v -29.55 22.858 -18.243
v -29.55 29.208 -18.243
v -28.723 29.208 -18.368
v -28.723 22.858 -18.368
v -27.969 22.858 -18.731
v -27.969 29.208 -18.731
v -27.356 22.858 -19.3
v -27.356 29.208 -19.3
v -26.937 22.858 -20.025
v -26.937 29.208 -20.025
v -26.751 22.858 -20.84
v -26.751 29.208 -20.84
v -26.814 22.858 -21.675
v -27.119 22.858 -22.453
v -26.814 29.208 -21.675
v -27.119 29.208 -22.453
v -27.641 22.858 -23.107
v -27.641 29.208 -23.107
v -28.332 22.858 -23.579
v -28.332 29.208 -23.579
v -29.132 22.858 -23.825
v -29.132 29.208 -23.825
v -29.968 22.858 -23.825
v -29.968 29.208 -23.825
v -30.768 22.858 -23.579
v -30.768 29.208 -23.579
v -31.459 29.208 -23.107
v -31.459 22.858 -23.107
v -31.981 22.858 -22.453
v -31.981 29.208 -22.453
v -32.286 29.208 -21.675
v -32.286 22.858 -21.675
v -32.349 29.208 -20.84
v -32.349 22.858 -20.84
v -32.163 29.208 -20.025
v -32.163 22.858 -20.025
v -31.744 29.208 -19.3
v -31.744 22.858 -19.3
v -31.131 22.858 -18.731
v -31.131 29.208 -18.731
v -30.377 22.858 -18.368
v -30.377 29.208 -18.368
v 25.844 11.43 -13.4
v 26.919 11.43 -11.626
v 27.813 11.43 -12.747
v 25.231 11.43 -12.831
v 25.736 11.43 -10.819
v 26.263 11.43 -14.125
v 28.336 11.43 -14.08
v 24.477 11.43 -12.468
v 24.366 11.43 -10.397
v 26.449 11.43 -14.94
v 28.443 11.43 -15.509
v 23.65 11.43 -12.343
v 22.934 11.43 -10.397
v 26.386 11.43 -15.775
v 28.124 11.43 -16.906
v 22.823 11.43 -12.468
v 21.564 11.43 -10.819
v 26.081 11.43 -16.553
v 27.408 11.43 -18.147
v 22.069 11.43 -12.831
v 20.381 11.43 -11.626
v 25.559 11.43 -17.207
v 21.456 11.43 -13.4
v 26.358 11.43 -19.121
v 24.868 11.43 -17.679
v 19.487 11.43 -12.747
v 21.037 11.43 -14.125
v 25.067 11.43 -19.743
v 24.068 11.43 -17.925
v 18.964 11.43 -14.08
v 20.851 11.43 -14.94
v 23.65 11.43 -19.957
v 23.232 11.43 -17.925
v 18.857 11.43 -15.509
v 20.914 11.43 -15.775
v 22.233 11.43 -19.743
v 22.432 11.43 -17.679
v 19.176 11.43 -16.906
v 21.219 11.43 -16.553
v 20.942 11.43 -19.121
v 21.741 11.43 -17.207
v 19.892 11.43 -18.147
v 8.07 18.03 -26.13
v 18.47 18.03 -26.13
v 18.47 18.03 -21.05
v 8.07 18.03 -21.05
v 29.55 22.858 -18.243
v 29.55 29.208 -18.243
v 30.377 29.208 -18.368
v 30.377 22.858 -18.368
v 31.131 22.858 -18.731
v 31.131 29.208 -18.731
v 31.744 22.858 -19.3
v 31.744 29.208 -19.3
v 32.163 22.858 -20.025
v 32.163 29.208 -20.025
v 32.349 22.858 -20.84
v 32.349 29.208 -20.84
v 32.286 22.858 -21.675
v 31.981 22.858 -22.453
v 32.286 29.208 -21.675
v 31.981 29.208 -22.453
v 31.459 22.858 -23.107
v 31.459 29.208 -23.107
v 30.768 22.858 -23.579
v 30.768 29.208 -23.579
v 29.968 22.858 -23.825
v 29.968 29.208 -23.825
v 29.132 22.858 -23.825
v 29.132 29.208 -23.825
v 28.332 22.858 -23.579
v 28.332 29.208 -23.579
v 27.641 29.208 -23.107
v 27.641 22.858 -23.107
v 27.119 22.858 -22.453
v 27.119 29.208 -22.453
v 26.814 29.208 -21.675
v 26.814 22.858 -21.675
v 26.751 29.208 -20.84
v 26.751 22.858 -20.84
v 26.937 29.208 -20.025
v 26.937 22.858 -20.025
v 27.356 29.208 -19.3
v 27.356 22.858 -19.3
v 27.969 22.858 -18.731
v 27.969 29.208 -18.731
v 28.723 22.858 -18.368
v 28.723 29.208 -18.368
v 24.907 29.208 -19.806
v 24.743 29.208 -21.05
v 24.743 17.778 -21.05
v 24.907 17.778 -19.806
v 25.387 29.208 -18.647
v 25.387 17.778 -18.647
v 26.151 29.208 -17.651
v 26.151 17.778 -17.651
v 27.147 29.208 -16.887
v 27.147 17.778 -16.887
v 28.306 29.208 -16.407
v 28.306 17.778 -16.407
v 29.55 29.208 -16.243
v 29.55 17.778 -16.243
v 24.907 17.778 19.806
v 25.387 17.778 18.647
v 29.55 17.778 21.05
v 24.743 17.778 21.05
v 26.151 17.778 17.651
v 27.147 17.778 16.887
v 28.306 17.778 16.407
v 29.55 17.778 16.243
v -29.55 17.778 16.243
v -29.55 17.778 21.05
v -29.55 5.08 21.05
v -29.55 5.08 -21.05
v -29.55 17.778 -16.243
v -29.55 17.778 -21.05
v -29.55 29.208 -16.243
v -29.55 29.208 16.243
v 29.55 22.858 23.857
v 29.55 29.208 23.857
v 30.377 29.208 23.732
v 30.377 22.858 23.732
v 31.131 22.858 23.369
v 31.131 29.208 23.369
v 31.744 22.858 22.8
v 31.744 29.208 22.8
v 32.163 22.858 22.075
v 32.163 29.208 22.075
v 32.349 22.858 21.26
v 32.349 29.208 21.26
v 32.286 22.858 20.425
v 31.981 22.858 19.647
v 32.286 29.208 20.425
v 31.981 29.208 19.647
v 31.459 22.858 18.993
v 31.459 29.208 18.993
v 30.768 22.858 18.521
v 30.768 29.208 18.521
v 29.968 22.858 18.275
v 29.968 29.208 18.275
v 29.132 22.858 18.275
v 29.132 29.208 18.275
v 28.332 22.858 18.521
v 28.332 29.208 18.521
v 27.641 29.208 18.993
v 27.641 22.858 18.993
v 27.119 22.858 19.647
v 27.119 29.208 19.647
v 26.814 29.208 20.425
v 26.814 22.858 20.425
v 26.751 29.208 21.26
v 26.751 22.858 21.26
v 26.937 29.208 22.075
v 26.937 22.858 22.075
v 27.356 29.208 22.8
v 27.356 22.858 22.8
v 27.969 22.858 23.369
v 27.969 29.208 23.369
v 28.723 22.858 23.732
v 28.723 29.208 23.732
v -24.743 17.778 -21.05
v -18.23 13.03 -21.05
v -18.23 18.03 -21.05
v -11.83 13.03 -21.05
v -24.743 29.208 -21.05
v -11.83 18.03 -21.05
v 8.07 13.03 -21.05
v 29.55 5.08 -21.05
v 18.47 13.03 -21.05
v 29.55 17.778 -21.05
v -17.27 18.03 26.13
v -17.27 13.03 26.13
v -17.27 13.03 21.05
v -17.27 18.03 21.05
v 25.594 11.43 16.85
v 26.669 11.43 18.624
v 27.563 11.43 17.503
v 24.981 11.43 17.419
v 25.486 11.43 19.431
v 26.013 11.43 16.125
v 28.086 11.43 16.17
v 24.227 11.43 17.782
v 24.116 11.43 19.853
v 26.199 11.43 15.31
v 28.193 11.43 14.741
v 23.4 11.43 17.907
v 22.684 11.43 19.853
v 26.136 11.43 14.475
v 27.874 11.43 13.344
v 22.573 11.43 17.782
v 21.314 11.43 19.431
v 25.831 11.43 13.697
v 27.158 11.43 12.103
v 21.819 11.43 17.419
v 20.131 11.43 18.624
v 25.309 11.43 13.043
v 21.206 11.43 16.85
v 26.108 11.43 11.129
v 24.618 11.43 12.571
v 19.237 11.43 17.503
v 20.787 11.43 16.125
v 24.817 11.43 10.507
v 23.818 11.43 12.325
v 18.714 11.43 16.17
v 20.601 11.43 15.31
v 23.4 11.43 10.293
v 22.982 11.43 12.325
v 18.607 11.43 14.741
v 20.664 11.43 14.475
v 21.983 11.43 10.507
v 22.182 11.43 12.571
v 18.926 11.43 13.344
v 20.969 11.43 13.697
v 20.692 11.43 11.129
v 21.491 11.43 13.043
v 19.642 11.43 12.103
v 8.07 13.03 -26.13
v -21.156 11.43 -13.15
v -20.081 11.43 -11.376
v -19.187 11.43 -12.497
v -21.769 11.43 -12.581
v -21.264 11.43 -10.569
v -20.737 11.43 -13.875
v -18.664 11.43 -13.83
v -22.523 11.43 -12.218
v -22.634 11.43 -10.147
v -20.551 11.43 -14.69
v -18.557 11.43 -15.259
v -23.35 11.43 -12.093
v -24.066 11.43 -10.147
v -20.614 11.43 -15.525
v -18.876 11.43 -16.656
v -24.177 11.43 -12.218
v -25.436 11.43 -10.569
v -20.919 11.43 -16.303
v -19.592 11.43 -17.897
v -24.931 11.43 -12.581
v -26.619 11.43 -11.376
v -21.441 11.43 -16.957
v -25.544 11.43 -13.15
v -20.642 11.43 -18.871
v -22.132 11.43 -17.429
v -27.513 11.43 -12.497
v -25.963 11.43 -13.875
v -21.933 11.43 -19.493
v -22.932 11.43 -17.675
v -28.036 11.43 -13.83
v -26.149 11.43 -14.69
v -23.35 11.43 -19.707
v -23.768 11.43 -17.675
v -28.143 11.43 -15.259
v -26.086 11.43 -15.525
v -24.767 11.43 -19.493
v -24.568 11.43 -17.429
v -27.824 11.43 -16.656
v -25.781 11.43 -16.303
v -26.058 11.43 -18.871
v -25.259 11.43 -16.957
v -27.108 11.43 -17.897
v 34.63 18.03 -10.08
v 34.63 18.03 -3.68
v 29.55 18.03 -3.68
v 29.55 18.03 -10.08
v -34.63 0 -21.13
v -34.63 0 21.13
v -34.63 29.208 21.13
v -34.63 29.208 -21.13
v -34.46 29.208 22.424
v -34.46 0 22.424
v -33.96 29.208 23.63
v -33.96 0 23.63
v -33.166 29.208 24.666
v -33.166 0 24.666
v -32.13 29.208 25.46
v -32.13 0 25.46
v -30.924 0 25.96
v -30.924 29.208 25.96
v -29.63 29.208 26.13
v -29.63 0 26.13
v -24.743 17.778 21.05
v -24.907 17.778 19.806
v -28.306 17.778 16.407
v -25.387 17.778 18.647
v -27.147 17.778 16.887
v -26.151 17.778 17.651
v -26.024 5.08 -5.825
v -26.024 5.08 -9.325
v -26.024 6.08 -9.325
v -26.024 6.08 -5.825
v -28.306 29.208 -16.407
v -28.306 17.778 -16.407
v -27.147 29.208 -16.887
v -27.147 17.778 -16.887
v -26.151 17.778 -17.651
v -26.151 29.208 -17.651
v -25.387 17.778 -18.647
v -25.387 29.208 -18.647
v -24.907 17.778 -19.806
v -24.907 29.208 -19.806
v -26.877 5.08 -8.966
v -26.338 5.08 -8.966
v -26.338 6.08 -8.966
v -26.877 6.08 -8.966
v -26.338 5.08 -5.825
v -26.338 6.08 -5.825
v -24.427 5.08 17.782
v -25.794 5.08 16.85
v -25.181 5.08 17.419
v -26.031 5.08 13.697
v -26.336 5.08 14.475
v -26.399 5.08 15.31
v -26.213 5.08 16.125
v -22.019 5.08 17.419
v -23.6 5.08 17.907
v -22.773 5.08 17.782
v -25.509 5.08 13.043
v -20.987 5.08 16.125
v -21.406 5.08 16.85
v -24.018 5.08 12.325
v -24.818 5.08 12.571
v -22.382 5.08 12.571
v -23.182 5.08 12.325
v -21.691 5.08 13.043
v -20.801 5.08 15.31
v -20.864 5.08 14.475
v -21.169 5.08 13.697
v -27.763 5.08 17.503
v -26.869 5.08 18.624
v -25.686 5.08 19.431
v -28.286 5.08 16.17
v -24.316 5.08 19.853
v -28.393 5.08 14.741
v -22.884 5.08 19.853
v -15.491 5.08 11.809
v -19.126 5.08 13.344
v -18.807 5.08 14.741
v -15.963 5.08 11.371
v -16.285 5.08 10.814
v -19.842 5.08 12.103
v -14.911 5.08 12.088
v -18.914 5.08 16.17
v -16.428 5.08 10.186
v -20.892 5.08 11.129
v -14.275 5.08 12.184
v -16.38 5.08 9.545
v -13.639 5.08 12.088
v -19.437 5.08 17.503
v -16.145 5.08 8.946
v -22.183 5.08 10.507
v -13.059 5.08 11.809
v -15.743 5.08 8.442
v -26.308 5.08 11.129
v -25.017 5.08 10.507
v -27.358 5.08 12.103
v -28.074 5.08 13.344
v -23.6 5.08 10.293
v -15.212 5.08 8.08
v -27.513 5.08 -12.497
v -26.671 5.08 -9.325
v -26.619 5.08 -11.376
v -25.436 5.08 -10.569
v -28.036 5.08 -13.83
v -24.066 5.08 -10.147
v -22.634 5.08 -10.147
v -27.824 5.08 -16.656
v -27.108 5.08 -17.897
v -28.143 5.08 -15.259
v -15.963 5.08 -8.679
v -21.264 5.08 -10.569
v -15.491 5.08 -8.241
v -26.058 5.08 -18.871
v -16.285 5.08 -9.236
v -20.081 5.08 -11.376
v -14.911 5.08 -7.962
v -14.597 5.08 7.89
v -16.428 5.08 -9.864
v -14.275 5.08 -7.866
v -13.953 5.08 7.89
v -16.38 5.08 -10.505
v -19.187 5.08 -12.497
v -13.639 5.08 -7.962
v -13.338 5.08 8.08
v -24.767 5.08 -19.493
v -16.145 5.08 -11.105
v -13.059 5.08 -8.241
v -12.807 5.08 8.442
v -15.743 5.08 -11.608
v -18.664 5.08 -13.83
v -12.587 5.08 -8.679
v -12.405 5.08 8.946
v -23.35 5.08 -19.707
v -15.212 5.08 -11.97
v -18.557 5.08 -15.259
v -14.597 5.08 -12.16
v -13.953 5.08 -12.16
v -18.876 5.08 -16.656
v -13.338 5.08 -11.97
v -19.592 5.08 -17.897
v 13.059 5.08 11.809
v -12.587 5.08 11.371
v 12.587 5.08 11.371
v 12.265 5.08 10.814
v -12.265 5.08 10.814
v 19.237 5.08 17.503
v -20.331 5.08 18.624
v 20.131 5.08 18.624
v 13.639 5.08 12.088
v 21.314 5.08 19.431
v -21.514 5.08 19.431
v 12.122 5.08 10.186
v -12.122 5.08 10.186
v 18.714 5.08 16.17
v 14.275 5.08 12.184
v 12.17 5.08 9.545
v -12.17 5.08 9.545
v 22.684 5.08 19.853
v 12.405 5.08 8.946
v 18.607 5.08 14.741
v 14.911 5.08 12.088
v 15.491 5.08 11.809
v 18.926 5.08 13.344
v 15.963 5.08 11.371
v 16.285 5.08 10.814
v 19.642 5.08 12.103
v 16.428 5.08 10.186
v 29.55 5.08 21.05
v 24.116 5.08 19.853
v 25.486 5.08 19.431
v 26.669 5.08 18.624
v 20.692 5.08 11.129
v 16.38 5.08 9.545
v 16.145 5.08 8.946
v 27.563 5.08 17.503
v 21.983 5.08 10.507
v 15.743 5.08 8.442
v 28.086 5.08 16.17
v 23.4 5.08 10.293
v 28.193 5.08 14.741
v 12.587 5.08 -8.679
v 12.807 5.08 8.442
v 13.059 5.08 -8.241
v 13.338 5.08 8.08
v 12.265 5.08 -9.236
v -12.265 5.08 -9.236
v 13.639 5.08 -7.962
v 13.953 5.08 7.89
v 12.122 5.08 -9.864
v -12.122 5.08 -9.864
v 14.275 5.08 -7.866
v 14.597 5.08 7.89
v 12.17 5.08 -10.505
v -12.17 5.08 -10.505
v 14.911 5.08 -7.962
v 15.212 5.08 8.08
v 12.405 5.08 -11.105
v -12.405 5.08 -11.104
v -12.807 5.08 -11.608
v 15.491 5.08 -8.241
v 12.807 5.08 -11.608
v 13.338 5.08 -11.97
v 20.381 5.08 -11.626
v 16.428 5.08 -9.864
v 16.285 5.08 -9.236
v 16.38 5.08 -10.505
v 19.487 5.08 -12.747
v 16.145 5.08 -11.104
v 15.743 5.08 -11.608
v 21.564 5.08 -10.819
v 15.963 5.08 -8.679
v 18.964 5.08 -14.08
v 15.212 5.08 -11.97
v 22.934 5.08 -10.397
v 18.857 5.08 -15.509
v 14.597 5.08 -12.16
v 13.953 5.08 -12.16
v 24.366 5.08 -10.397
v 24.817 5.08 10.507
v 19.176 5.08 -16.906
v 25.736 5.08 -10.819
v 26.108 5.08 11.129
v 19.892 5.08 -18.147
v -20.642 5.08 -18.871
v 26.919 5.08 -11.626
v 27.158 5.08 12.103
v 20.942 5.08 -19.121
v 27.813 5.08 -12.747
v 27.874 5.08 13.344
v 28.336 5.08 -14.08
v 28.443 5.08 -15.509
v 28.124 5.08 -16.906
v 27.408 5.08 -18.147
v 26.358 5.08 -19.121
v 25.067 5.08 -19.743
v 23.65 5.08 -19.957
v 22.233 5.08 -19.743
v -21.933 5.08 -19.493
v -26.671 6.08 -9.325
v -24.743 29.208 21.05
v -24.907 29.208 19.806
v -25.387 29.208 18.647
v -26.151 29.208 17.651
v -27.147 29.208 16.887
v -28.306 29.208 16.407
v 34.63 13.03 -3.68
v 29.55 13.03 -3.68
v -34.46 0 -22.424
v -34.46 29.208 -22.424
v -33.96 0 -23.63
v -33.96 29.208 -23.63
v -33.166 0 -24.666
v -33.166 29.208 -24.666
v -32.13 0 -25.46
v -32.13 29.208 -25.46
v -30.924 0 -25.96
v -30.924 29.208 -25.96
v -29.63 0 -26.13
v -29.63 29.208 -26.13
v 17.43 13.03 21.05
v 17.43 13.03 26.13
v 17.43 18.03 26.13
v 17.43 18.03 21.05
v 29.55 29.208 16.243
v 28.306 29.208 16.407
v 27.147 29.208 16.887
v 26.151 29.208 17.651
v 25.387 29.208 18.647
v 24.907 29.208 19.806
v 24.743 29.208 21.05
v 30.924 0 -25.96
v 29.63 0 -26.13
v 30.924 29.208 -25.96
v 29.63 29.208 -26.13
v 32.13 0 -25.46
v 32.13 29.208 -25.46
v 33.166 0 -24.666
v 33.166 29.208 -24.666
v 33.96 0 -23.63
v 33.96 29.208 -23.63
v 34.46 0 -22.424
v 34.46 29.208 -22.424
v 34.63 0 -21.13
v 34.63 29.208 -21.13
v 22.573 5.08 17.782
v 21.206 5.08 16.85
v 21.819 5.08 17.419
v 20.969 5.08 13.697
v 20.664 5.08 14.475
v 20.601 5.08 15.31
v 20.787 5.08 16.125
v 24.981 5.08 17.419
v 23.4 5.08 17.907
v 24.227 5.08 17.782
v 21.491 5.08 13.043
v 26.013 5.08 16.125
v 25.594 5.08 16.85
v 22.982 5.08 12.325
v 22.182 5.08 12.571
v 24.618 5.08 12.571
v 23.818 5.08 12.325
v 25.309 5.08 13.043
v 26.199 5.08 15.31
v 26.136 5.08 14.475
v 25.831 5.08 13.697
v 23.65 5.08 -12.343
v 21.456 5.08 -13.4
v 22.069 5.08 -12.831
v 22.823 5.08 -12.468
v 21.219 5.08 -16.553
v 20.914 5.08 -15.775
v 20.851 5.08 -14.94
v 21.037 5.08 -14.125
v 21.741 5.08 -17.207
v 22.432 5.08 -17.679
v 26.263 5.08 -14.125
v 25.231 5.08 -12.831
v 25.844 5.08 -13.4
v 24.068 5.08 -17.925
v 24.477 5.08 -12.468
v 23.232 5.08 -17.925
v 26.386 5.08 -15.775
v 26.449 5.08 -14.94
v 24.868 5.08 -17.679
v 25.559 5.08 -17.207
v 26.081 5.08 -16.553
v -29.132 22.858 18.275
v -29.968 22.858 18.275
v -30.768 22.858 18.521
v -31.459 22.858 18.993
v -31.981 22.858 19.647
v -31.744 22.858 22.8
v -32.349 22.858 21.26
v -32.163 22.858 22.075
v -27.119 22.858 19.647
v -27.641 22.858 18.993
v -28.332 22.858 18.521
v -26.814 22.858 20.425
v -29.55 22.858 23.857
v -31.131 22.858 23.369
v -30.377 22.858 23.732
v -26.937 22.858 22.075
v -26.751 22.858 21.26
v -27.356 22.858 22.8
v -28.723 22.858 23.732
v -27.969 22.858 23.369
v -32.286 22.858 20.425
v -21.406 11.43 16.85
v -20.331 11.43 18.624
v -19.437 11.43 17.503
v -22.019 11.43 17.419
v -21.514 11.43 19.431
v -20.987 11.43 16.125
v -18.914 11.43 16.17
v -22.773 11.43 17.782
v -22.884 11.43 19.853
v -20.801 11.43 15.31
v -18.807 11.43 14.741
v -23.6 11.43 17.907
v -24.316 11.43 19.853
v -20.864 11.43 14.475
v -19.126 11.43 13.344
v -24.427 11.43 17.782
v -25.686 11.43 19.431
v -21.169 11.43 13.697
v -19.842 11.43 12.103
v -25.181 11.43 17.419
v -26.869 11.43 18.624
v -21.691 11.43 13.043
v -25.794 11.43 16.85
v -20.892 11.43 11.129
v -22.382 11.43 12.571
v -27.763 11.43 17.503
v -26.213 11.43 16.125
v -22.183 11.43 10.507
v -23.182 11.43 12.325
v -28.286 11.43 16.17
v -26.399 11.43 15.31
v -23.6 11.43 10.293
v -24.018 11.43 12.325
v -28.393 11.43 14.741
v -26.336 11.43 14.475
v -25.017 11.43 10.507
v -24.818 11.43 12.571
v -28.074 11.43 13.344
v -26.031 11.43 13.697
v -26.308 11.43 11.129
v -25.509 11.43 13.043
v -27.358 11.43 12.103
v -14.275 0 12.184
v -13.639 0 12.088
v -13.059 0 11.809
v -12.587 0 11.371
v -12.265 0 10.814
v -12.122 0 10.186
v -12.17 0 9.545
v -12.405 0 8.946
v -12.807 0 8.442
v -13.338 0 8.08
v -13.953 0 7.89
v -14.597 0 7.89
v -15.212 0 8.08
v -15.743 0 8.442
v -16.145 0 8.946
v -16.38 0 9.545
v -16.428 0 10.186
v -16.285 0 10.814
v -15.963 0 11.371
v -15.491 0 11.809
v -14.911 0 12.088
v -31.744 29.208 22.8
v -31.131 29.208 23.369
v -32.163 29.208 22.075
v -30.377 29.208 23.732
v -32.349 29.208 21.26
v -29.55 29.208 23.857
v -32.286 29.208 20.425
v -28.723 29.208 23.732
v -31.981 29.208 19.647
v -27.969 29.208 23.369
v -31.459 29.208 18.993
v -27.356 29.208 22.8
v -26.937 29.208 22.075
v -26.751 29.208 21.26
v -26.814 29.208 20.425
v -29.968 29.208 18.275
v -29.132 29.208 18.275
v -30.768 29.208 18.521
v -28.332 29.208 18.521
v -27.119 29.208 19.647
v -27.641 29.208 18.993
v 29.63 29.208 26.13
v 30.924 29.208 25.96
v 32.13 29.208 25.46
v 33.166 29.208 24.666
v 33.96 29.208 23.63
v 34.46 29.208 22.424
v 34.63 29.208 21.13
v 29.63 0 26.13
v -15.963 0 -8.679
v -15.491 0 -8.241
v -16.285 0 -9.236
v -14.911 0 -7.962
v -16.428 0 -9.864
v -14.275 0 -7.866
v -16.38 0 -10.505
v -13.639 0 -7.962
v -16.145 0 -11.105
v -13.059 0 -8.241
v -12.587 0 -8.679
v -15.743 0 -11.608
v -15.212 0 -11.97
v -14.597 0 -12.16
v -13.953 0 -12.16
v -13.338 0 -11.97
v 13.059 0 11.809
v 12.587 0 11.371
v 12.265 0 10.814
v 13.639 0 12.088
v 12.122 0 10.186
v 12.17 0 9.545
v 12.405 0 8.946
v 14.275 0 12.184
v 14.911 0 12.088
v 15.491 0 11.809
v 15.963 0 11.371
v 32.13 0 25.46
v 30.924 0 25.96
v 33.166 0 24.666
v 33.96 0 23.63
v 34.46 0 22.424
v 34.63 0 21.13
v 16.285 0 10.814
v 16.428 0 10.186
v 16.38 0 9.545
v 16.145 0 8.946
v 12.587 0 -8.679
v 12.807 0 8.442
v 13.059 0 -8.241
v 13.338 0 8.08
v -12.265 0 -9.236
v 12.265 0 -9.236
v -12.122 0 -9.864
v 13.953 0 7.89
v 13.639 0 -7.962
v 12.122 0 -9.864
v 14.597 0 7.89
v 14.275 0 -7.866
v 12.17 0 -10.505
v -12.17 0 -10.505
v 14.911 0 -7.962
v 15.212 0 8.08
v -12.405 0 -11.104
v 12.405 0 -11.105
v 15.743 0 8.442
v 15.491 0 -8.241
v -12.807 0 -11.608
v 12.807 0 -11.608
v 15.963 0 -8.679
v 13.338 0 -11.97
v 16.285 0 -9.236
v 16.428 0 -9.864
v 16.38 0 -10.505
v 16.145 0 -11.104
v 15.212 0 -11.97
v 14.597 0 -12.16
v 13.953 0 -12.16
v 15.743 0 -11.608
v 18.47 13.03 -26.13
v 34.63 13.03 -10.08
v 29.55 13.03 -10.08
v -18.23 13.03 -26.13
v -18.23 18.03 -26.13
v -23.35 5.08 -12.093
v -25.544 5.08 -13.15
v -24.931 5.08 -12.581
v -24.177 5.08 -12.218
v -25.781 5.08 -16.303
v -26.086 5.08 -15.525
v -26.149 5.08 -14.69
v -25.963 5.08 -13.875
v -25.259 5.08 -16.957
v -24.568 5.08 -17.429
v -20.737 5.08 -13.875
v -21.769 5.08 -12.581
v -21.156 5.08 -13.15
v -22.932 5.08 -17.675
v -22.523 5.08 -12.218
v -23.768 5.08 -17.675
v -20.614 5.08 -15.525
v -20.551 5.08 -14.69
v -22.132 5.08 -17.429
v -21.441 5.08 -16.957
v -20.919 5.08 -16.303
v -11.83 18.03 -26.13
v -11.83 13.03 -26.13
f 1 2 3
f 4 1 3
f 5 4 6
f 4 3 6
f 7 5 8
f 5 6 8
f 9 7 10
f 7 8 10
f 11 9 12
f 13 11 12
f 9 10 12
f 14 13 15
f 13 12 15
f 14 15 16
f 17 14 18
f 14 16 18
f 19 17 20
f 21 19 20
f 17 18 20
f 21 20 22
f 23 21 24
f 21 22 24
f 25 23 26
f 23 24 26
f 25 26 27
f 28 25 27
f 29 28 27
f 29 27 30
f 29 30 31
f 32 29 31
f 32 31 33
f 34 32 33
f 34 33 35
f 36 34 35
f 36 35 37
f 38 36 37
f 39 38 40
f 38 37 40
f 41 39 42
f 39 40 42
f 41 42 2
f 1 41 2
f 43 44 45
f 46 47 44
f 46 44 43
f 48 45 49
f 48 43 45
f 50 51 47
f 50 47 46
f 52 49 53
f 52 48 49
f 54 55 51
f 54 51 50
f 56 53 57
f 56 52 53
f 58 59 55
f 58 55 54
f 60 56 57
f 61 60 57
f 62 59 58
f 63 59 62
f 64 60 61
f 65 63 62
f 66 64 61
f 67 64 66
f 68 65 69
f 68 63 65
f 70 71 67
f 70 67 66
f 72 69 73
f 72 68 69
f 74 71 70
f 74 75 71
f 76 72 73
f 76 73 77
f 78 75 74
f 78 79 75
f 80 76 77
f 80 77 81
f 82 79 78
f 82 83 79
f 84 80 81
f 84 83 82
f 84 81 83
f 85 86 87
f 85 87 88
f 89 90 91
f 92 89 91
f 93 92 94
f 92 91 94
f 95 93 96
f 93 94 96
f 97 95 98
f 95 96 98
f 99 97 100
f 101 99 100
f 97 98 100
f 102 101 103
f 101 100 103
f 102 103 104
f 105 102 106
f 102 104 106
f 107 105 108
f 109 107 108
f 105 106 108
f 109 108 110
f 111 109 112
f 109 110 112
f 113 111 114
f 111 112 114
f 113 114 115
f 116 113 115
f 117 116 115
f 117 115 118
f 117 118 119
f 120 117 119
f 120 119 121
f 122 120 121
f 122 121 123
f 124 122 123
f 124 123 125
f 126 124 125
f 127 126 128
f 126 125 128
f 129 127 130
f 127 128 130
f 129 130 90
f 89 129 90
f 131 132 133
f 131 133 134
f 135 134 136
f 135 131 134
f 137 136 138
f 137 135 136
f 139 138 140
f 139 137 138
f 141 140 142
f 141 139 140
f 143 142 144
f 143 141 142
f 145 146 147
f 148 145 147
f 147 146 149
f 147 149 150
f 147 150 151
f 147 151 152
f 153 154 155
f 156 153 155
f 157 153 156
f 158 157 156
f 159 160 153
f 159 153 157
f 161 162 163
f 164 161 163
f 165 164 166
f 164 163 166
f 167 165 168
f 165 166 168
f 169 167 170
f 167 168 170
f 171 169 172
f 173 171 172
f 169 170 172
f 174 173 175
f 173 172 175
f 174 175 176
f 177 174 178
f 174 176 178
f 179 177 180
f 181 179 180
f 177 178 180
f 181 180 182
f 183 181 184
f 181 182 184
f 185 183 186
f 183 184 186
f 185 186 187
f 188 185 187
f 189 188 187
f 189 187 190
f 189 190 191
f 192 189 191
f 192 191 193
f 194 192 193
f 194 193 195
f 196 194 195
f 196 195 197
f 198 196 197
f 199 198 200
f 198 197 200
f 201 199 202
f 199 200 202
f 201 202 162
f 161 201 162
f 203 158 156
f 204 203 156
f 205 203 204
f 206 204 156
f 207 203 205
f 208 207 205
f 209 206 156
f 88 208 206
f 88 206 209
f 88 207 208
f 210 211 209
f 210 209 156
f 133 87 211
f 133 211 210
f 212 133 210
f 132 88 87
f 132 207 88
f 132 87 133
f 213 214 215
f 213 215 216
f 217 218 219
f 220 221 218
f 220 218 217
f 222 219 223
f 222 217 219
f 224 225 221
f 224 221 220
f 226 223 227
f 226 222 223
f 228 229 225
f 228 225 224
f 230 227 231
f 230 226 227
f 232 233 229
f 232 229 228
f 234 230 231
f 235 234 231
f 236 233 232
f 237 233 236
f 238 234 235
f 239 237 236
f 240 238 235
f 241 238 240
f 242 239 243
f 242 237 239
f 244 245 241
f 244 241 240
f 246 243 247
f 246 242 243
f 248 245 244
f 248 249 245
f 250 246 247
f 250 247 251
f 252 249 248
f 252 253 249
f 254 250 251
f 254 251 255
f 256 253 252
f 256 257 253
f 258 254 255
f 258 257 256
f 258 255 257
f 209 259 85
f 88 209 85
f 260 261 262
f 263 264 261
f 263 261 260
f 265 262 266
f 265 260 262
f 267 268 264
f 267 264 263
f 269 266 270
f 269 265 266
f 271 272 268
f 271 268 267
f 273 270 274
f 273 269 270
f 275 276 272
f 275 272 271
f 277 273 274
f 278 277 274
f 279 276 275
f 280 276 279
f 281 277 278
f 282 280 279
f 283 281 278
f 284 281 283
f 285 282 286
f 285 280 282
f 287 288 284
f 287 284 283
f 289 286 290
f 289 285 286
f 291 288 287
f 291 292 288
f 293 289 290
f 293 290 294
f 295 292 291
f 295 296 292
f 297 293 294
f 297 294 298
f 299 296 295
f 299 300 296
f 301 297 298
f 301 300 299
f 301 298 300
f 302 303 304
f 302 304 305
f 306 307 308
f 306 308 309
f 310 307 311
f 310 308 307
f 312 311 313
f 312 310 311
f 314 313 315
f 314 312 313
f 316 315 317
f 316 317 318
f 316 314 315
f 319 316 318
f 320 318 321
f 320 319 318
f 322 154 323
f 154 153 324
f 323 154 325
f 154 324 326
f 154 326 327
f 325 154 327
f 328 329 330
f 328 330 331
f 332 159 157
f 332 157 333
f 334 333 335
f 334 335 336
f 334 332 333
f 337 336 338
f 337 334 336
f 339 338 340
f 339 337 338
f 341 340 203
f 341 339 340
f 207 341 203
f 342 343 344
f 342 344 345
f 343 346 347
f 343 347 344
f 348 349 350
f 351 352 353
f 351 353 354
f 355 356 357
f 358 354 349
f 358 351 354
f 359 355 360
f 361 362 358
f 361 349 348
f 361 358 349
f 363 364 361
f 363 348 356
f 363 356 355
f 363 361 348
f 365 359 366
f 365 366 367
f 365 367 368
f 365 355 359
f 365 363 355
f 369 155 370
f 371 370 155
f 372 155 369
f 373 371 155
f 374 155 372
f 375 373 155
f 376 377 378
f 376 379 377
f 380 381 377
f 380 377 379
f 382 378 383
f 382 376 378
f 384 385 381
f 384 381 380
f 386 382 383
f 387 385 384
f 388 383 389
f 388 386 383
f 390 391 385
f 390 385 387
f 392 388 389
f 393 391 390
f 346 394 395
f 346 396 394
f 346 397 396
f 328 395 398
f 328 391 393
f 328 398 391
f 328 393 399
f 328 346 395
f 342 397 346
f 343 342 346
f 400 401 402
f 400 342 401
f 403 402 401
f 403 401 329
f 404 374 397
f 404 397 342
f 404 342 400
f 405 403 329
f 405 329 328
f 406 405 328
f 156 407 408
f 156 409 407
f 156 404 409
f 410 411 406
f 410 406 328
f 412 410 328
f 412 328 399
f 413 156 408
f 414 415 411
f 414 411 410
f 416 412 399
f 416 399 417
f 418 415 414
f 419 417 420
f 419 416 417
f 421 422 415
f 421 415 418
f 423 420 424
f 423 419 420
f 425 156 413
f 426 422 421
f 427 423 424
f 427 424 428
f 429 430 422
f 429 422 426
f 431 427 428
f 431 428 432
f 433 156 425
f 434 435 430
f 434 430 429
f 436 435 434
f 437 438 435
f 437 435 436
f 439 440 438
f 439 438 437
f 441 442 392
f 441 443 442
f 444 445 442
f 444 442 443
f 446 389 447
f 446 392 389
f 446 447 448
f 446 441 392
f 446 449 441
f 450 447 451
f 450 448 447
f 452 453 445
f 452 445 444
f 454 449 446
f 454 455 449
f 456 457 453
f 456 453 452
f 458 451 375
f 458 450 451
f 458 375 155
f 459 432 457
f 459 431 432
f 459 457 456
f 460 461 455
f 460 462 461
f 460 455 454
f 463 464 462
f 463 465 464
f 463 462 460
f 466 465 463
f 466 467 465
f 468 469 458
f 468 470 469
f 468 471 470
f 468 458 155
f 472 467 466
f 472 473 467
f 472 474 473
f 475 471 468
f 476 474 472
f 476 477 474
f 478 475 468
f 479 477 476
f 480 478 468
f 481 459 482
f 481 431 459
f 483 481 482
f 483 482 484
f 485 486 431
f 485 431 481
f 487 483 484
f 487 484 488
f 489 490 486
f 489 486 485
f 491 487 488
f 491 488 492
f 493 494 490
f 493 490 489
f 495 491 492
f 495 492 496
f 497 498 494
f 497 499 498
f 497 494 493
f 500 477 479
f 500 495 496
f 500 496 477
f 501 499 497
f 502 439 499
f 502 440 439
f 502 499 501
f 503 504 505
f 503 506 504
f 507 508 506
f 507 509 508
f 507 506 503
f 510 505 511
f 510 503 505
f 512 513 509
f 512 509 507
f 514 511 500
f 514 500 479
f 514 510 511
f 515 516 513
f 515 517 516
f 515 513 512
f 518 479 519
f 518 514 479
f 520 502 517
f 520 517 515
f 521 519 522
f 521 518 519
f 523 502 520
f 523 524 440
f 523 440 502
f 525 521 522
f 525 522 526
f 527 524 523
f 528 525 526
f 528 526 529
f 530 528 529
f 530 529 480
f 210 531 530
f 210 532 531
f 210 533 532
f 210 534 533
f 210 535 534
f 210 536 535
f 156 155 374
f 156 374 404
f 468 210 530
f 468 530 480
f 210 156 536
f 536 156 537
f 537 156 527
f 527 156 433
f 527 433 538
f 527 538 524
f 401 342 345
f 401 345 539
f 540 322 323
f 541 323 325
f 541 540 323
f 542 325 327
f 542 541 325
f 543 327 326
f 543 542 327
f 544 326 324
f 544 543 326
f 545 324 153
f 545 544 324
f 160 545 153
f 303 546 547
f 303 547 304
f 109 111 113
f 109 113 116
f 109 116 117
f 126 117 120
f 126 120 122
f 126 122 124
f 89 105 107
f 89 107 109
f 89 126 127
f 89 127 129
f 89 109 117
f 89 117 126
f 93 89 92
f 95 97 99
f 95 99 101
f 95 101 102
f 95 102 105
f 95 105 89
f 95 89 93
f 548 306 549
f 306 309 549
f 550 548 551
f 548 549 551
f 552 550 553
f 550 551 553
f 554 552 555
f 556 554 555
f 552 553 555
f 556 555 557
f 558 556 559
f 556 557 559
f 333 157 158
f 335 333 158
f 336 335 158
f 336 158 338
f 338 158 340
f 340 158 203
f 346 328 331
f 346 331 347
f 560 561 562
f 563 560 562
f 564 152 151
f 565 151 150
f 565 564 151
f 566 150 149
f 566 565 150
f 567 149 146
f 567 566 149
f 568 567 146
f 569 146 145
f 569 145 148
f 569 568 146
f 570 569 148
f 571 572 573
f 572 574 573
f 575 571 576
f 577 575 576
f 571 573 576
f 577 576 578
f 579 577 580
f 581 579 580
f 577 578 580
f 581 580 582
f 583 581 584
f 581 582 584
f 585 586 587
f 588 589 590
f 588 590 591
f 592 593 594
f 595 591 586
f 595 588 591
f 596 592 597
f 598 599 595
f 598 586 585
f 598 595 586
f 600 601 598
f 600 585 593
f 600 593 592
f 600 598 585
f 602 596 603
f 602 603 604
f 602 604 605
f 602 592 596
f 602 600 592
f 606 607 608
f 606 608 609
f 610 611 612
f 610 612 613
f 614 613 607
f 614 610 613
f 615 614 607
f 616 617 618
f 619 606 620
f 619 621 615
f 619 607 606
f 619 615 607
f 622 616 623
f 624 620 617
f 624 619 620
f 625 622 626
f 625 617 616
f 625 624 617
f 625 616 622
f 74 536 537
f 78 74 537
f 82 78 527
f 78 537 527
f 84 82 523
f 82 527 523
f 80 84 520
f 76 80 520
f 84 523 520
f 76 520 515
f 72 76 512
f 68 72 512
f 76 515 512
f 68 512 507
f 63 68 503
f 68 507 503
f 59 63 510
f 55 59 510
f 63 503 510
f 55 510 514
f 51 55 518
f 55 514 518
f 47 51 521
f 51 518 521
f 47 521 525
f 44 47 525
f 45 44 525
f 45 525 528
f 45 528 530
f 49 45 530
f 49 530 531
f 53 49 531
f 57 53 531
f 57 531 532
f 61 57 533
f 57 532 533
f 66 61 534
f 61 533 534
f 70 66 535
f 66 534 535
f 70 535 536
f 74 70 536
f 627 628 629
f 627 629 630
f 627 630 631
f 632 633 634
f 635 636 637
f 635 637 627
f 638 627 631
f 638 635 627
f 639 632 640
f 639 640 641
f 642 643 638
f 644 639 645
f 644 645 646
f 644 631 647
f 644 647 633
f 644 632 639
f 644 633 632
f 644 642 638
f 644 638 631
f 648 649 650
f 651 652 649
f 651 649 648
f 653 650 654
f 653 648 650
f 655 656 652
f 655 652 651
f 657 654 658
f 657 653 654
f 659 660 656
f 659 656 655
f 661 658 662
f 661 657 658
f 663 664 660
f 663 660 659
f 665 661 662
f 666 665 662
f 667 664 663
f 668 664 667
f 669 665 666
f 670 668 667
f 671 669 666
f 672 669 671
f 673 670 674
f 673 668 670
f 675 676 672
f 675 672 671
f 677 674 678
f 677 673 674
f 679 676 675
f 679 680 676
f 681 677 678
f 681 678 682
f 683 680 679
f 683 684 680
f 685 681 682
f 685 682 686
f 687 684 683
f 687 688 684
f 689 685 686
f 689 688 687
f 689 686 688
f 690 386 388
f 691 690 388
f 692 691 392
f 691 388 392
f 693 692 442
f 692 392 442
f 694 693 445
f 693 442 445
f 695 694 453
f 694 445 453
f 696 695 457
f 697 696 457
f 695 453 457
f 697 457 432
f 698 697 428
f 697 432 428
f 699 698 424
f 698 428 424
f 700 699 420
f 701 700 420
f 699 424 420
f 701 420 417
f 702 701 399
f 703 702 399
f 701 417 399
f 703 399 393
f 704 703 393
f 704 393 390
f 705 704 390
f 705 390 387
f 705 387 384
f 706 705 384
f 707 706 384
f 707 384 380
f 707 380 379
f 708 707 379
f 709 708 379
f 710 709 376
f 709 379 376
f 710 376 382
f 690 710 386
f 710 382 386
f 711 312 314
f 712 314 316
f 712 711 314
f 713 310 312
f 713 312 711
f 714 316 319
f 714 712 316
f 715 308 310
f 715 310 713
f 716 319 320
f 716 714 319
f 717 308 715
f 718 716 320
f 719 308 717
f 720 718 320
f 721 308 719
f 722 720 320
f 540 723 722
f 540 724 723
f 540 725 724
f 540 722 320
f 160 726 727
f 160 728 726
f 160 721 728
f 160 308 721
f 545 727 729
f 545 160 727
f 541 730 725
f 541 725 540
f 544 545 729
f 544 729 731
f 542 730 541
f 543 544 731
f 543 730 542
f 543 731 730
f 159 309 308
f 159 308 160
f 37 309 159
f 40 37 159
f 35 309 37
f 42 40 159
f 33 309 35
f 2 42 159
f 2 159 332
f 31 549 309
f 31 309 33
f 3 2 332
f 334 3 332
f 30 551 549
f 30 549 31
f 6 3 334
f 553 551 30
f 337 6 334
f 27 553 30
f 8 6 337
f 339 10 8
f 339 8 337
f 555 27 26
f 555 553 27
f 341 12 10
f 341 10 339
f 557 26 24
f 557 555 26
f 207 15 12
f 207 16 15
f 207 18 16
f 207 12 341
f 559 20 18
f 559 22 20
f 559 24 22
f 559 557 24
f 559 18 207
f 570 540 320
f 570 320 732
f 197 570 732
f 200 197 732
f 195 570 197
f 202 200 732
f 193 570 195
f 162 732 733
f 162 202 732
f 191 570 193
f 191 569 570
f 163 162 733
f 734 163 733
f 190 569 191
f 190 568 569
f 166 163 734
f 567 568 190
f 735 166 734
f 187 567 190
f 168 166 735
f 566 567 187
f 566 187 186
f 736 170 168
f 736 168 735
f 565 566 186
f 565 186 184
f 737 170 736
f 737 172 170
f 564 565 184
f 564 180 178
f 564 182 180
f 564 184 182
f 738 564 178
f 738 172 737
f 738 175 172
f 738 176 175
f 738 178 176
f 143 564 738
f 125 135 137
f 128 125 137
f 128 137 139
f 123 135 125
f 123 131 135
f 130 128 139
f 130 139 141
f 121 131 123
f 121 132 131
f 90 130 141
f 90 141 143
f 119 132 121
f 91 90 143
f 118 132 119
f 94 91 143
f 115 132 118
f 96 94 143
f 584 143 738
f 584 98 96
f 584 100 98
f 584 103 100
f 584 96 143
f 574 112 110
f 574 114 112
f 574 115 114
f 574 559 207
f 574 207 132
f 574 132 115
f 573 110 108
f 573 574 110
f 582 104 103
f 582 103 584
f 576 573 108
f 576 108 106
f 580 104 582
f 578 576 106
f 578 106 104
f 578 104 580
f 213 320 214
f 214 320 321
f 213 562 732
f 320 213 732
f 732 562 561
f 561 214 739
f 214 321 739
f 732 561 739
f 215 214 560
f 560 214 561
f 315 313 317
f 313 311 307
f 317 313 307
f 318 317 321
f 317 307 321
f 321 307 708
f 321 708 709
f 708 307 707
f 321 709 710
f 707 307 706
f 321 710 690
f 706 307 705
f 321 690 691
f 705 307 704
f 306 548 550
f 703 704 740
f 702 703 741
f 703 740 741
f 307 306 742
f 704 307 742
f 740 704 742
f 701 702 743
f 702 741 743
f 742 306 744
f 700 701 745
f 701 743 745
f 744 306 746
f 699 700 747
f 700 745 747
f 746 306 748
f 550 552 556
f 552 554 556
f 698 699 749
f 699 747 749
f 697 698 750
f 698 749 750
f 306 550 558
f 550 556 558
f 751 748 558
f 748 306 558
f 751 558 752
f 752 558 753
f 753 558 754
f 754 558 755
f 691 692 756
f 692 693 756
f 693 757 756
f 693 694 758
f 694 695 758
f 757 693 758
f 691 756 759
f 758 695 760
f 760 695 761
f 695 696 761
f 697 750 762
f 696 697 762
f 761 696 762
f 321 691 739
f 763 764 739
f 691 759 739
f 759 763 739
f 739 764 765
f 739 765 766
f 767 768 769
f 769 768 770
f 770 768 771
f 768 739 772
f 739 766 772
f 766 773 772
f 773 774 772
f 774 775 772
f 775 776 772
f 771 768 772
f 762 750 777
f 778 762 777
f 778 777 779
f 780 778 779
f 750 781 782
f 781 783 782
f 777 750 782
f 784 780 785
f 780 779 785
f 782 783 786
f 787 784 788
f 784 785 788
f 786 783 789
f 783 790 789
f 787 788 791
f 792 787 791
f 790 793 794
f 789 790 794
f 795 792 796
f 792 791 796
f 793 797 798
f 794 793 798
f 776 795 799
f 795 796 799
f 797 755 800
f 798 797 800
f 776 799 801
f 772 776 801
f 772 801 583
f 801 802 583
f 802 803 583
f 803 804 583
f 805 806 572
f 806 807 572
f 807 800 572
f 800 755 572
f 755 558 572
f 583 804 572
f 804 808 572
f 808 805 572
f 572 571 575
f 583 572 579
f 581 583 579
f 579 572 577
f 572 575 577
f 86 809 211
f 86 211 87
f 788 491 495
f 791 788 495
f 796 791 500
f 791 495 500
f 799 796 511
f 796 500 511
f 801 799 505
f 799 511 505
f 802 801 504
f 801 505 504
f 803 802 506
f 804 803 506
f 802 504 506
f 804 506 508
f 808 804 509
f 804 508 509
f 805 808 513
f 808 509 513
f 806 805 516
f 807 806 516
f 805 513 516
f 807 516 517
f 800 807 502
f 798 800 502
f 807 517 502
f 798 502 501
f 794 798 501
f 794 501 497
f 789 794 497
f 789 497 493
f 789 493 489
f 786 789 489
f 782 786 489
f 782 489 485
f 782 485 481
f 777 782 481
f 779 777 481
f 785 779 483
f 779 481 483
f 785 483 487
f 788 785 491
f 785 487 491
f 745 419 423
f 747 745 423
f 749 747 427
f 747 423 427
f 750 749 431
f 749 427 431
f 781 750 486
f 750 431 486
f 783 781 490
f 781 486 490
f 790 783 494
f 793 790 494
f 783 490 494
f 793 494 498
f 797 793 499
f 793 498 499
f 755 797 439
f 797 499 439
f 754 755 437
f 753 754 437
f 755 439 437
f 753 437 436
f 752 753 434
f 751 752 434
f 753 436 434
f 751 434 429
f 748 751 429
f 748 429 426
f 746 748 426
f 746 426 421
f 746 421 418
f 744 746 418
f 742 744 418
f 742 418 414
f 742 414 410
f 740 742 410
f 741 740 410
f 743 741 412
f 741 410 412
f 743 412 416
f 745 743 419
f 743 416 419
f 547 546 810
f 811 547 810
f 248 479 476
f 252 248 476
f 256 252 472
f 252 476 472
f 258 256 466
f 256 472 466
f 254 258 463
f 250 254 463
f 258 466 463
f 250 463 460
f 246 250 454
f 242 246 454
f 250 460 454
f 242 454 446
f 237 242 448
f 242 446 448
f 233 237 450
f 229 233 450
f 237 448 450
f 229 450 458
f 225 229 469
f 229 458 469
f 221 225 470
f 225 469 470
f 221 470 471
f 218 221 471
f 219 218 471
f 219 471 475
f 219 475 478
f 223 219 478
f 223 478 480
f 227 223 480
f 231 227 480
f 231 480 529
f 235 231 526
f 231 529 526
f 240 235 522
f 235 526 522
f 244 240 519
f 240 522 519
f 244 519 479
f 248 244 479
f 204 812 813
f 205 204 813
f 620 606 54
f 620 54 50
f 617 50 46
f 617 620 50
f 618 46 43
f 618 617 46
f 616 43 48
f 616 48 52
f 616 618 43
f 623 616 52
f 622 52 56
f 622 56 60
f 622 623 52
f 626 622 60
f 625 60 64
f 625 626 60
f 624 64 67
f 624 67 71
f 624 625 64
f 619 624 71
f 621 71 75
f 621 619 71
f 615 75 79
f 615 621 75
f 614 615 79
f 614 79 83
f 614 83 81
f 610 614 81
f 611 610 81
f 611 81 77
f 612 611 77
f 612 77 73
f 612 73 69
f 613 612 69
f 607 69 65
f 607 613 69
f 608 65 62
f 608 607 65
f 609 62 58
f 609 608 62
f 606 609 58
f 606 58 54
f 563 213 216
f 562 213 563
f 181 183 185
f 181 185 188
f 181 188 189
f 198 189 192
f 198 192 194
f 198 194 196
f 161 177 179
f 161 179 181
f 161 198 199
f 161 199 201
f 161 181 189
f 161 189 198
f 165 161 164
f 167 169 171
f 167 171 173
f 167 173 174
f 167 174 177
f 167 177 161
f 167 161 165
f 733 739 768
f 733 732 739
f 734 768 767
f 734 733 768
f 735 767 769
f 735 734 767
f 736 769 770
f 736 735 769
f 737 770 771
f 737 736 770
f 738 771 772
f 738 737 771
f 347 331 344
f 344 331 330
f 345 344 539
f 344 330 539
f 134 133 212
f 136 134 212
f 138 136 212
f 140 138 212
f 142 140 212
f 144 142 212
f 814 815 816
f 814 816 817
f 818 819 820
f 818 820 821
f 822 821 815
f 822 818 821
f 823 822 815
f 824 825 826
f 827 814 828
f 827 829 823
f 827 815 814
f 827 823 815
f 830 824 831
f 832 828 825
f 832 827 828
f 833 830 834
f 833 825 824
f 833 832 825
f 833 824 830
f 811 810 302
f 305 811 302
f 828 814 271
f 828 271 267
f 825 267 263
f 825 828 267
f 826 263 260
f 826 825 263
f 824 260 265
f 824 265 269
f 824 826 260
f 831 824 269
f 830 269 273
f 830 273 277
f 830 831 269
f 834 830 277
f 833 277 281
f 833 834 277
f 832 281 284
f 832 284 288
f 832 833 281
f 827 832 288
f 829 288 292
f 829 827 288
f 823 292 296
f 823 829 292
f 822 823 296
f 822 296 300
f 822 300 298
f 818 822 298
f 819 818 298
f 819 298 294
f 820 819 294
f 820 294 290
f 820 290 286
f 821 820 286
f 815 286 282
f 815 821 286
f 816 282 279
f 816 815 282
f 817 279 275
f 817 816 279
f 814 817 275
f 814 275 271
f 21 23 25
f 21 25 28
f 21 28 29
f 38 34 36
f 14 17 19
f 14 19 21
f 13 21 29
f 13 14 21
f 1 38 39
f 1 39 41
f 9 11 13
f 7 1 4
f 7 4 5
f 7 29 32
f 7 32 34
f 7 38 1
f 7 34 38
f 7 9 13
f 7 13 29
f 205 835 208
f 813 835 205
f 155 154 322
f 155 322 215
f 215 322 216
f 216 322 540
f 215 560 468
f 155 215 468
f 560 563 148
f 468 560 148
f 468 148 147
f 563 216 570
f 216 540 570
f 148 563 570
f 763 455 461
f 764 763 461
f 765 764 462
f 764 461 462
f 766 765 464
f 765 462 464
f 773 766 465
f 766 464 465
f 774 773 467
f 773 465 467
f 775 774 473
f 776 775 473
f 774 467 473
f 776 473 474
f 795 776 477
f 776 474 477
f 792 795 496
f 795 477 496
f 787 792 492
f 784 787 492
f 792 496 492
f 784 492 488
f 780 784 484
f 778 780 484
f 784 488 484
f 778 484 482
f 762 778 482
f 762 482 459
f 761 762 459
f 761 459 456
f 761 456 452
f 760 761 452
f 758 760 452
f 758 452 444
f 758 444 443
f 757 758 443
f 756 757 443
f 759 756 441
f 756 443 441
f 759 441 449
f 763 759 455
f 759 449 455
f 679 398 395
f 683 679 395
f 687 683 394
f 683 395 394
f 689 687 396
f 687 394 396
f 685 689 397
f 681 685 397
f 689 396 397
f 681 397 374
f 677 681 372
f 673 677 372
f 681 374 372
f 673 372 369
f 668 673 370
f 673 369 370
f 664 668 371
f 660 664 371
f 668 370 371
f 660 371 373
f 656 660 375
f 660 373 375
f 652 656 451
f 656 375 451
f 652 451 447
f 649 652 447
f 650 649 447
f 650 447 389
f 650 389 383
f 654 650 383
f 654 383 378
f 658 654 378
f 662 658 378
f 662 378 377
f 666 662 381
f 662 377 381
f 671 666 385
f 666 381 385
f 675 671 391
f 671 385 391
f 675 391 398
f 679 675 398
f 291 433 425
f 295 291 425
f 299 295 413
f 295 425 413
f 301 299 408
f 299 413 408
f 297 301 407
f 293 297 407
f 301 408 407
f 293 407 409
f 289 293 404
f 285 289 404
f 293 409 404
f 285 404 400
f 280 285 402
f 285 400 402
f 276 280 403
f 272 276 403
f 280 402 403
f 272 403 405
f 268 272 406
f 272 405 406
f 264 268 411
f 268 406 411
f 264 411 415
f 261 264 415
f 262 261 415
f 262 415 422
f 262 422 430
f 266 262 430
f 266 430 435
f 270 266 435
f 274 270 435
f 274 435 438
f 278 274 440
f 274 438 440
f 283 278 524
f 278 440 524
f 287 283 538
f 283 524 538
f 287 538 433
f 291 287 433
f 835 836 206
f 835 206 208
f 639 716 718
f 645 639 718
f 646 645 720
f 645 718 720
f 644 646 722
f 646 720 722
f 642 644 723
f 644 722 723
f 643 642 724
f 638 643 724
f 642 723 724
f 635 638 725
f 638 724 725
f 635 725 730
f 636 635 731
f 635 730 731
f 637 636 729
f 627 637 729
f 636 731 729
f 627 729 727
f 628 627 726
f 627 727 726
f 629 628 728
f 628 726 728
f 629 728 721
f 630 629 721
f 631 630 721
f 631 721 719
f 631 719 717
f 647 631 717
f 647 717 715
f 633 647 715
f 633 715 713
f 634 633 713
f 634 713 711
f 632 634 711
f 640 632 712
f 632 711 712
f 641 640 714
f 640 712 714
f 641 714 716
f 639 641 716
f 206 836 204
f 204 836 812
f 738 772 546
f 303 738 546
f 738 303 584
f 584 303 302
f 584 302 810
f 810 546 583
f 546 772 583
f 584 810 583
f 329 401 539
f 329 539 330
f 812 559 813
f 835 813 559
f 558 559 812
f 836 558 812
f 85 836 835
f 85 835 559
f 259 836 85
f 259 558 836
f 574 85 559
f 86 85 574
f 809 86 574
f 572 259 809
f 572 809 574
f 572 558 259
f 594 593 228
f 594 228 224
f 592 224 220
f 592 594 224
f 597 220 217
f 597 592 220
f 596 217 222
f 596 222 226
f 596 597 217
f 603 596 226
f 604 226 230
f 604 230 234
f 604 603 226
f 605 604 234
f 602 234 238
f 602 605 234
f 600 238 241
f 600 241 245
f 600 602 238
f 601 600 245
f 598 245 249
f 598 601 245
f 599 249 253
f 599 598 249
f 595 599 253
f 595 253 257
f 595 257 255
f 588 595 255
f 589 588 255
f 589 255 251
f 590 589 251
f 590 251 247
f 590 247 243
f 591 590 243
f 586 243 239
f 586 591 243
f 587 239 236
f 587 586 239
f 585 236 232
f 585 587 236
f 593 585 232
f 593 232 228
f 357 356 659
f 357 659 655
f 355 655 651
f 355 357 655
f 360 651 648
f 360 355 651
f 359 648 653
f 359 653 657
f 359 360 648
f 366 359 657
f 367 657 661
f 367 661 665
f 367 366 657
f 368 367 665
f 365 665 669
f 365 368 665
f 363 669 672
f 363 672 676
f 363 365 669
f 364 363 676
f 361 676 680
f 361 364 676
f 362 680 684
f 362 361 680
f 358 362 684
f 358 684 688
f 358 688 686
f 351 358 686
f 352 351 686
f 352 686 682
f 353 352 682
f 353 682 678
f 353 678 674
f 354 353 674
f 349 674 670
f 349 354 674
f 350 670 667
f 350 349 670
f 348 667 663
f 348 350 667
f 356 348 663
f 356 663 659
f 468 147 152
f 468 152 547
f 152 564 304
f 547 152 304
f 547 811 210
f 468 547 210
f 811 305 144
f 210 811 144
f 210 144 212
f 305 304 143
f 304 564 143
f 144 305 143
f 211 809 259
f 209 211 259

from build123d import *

# Parameters (mm, degrees)
SKETCH1_W                  = 69.26
SKETCH1_H                  = 52.26
BOSS_EXTRUDE3_DEPTH        = 29.208
SKETCH2_W                  = 59.1
SKETCH2_H                  = 42.1
CUT_EXTRUDE4_DEPTH         = 24.128
FILLET1_R                  = 5
SKETCH3_R                  = 4.8067
BOSS_EXTRUDE4_DEPTH        = 11.43
SKETCH3_3_R                = 2.8067
CUT_EXTRUDE5_DEPTH         = 6.35
SKETCH9_R                  = 4.8067
SKETCH9_R_2                = 2.8067
BOSS_EXTRUDE5_DEPTH        = 6.35
SKETCH10_R                 = 2.159
CUT_EXTRUDE6_DEPTH         = 5.08
BOSS_EXTRUDE6_DEPTH        = 1
FACE_2_CONNECTOR_HOLES_W   = 6.4
FACE_2_CONNECTOR_HOLES_H   = 5
FACE_2_CONNECTOR_HOLES_W_2 = 10.4
CUT_EXTRUDE7_DEPTH         = 5.08
FACE_3_CONNECTOR_HOLES_W   = 6.4
FACE_3_CONNECTOR_HOLES_H   = 5
CUT_EXTRUDE8_DEPTH         = 5.08
FACE_4_CONNECTOR_HOLES_W   = 34.7
FACE_4_CONNECTOR_HOLES_H   = 5
CUT_EXTRUDE9_DEPTH         = 5.08


with BuildPart() as part:
    # Sketch1 → Boss-Extrude3 (new body)
    with BuildSketch(Plane(origin=(0, 0, 0), x_dir=(1, 0, 0), z_dir=(0, 1, 0))):
        Rectangle(SKETCH1_W, SKETCH1_H)
    extrude(amount=BOSS_EXTRUDE3_DEPTH)

    # Sketch2 → Cut-Extrude4 (cut)
    with BuildSketch(Plane(origin=(0, 29.208, 0), x_dir=(1, 0, 0), z_dir=(0, 1, 0))):
        Rectangle(SKETCH2_W, SKETCH2_H)
    extrude(amount=-CUT_EXTRUDE4_DEPTH, mode=Mode.SUBTRACT)

    # Fillet1
    fillet1_edges = [part.edges().sort_by_distance(p)[0] for p in [
        (-34.63, 14.604, 26.13),
        (34.63, 14.604, 26.13),
        (34.63, 14.604, -26.13),
        (-34.63, 14.604, -26.13),
    ]]
    fillet(fillet1_edges, radius=FILLET1_R)

    # Sketch3 → Boss-Extrude4 (add)
    with BuildSketch(Plane(origin=(0, 29.208, 0), x_dir=(1, 0, 0), z_dir=(0, 1, 0))):
        with Locations((-29.55, 21.05)):
            Circle(SKETCH3_R)
        with Locations((29.55, 21.05)):
            Circle(SKETCH3_R)
        with Locations((-29.55, -21.05)):
            Circle(SKETCH3_R)
        with Locations((29.55, -21.05)):
            Circle(SKETCH3_R)
    extrude(amount=-BOSS_EXTRUDE4_DEPTH)

    # Sketch3<3> → Cut-Extrude5 (cut)
    with BuildSketch(Plane(origin=(0, 29.208, 0), x_dir=(1, 0, 0), z_dir=(0, 1, 0))):
        with Locations(Location((-29.55, 21.05, 0), (0, 0, 270))):
            Circle(SKETCH3_3_R)
        with Locations(Location((29.55, 21.05, 0), (0, 0, 270))):
            Circle(SKETCH3_3_R)
        with Locations(Location((29.55, -21.05, 0), (0, 0, 270))):
            Circle(SKETCH3_3_R)
        with Locations(Location((-29.55, -21.05, 0), (0, 0, 270))):
            Circle(SKETCH3_3_R)
    extrude(amount=-CUT_EXTRUDE5_DEPTH, mode=Mode.SUBTRACT)

    # Sketch9 → Boss-Extrude5 (add)
    # profile 1 of 4: a face of its own
    with BuildSketch(Plane(origin=(0, 5.08, 0), x_dir=(1, 0, 0), z_dir=(0, 1, 0))):
        with Locations(Location((-23.35, 14.9, 0), (0, 0, 90))):
            Circle(SKETCH9_R)
        with Locations(Location((-23.35, 14.9, 0), (0, 0, 270))):
            Circle(SKETCH9_R_2, mode=Mode.SUBTRACT)
    # profile 2 of 4: a face of its own
    with BuildSketch(Plane(origin=(0, 5.08, 0), x_dir=(1, 0, 0), z_dir=(0, 1, 0))):
        with Locations(Location((23.65, 15.15, 0), (0, 0, 90))):
            Circle(SKETCH9_R)
        with Locations(Location((23.65, 15.15, 0), (0, 0, 270))):
            Circle(SKETCH9_R_2, mode=Mode.SUBTRACT)
    # profile 3 of 4: a face of its own
    with BuildSketch(Plane(origin=(0, 5.08, 0), x_dir=(1, 0, 0), z_dir=(0, 1, 0))):
        with Locations(Location((23.4, -15.1, 0), (0, 0, 90))):
            Circle(SKETCH9_R)
        with Locations(Location((23.4, -15.1, 0), (0, 0, 270))):
            Circle(SKETCH9_R_2, mode=Mode.SUBTRACT)
    # profile 4 of 4: a face of its own
    with BuildSketch(Plane(origin=(0, 5.08, 0), x_dir=(1, 0, 0), z_dir=(0, 1, 0))):
        with Locations(Location((-23.6, -15.1, 0), (0, 0, 90))):
            Circle(SKETCH9_R)
        with Locations(Location((-23.6, -15.1, 0), (0, 0, 270))):
            Circle(SKETCH9_R_2, mode=Mode.SUBTRACT)
    extrude(amount=BOSS_EXTRUDE5_DEPTH)

    # Sketch10 → Cut-Extrude6 (cut)
    with BuildSketch(Plane(origin=(0, 5.08, 0), x_dir=(1, 0, 0), z_dir=(0, 1, 0))):
        with Locations(Location((14.275, 10.025, 0), (0, 0, 270))):
            Circle(SKETCH10_R)
        with Locations(Location((14.275, -10.025, 0), (0, 0, 270))):
            Circle(SKETCH10_R)
        with Locations(Location((-14.275, 10.025, 0), (0, 0, 270))):
            Circle(SKETCH10_R)
        with Locations(Location((-14.275, -10.025, 0), (0, 0, 270))):
            Circle(SKETCH10_R)
    extrude(amount=-CUT_EXTRUDE6_DEPTH, mode=Mode.SUBTRACT)

    # Sketch12 → Boss-Extrude6 (add)
    with BuildSketch(Plane(origin=(0, 5.08, 0), x_dir=(1, 0, 0), z_dir=(0, 1, 0))):
        Polygon((-26.671494391, 9.324758956), (-26.024358974, 9.324758956), (-26.024358974, 5.824758956), (-26.338461538, 5.824758956), (-26.338461538, 8.965784597), (-26.876923077, 8.965784597), align=None)
    extrude(amount=BOSS_EXTRUDE6_DEPTH)

    # Face 2 Connector Holes → Cut-Extrude7 (cut)
    with BuildSketch(Plane(origin=(0, 0, -26.13), x_dir=(-1, 0, 0), z_dir=(0, 0, -1))):
        with Locations((15.03, 15.53)):
            Rectangle(FACE_2_CONNECTOR_HOLES_W, FACE_2_CONNECTOR_HOLES_H)
        with Locations((-13.27, 15.53)):
            Rectangle(FACE_2_CONNECTOR_HOLES_W_2, FACE_2_CONNECTOR_HOLES_H)
    extrude(amount=-CUT_EXTRUDE7_DEPTH, mode=Mode.SUBTRACT)

    # Face 3 Connector Holes → Cut-Extrude8 (cut)
    with BuildSketch(Plane(origin=(34.63, 0, 0), x_dir=(0, 0, -1), z_dir=(1, 0, 0))):
        with Locations((6.88, 15.53)):
            Rectangle(FACE_3_CONNECTOR_HOLES_W, FACE_3_CONNECTOR_HOLES_H)
    extrude(amount=-CUT_EXTRUDE8_DEPTH, mode=Mode.SUBTRACT)

    # Face 4 Connector Holes → Cut-Extrude9 (cut)
    with BuildSketch(Plane.XY.offset(26.13)):
        with Locations((0.08, 15.53)):
            Rectangle(FACE_4_CONNECTOR_HOLES_W, FACE_4_CONNECTOR_HOLES_H)
    extrude(amount=-CUT_EXTRUDE9_DEPTH, mode=Mode.SUBTRACT)


solid = part.part
